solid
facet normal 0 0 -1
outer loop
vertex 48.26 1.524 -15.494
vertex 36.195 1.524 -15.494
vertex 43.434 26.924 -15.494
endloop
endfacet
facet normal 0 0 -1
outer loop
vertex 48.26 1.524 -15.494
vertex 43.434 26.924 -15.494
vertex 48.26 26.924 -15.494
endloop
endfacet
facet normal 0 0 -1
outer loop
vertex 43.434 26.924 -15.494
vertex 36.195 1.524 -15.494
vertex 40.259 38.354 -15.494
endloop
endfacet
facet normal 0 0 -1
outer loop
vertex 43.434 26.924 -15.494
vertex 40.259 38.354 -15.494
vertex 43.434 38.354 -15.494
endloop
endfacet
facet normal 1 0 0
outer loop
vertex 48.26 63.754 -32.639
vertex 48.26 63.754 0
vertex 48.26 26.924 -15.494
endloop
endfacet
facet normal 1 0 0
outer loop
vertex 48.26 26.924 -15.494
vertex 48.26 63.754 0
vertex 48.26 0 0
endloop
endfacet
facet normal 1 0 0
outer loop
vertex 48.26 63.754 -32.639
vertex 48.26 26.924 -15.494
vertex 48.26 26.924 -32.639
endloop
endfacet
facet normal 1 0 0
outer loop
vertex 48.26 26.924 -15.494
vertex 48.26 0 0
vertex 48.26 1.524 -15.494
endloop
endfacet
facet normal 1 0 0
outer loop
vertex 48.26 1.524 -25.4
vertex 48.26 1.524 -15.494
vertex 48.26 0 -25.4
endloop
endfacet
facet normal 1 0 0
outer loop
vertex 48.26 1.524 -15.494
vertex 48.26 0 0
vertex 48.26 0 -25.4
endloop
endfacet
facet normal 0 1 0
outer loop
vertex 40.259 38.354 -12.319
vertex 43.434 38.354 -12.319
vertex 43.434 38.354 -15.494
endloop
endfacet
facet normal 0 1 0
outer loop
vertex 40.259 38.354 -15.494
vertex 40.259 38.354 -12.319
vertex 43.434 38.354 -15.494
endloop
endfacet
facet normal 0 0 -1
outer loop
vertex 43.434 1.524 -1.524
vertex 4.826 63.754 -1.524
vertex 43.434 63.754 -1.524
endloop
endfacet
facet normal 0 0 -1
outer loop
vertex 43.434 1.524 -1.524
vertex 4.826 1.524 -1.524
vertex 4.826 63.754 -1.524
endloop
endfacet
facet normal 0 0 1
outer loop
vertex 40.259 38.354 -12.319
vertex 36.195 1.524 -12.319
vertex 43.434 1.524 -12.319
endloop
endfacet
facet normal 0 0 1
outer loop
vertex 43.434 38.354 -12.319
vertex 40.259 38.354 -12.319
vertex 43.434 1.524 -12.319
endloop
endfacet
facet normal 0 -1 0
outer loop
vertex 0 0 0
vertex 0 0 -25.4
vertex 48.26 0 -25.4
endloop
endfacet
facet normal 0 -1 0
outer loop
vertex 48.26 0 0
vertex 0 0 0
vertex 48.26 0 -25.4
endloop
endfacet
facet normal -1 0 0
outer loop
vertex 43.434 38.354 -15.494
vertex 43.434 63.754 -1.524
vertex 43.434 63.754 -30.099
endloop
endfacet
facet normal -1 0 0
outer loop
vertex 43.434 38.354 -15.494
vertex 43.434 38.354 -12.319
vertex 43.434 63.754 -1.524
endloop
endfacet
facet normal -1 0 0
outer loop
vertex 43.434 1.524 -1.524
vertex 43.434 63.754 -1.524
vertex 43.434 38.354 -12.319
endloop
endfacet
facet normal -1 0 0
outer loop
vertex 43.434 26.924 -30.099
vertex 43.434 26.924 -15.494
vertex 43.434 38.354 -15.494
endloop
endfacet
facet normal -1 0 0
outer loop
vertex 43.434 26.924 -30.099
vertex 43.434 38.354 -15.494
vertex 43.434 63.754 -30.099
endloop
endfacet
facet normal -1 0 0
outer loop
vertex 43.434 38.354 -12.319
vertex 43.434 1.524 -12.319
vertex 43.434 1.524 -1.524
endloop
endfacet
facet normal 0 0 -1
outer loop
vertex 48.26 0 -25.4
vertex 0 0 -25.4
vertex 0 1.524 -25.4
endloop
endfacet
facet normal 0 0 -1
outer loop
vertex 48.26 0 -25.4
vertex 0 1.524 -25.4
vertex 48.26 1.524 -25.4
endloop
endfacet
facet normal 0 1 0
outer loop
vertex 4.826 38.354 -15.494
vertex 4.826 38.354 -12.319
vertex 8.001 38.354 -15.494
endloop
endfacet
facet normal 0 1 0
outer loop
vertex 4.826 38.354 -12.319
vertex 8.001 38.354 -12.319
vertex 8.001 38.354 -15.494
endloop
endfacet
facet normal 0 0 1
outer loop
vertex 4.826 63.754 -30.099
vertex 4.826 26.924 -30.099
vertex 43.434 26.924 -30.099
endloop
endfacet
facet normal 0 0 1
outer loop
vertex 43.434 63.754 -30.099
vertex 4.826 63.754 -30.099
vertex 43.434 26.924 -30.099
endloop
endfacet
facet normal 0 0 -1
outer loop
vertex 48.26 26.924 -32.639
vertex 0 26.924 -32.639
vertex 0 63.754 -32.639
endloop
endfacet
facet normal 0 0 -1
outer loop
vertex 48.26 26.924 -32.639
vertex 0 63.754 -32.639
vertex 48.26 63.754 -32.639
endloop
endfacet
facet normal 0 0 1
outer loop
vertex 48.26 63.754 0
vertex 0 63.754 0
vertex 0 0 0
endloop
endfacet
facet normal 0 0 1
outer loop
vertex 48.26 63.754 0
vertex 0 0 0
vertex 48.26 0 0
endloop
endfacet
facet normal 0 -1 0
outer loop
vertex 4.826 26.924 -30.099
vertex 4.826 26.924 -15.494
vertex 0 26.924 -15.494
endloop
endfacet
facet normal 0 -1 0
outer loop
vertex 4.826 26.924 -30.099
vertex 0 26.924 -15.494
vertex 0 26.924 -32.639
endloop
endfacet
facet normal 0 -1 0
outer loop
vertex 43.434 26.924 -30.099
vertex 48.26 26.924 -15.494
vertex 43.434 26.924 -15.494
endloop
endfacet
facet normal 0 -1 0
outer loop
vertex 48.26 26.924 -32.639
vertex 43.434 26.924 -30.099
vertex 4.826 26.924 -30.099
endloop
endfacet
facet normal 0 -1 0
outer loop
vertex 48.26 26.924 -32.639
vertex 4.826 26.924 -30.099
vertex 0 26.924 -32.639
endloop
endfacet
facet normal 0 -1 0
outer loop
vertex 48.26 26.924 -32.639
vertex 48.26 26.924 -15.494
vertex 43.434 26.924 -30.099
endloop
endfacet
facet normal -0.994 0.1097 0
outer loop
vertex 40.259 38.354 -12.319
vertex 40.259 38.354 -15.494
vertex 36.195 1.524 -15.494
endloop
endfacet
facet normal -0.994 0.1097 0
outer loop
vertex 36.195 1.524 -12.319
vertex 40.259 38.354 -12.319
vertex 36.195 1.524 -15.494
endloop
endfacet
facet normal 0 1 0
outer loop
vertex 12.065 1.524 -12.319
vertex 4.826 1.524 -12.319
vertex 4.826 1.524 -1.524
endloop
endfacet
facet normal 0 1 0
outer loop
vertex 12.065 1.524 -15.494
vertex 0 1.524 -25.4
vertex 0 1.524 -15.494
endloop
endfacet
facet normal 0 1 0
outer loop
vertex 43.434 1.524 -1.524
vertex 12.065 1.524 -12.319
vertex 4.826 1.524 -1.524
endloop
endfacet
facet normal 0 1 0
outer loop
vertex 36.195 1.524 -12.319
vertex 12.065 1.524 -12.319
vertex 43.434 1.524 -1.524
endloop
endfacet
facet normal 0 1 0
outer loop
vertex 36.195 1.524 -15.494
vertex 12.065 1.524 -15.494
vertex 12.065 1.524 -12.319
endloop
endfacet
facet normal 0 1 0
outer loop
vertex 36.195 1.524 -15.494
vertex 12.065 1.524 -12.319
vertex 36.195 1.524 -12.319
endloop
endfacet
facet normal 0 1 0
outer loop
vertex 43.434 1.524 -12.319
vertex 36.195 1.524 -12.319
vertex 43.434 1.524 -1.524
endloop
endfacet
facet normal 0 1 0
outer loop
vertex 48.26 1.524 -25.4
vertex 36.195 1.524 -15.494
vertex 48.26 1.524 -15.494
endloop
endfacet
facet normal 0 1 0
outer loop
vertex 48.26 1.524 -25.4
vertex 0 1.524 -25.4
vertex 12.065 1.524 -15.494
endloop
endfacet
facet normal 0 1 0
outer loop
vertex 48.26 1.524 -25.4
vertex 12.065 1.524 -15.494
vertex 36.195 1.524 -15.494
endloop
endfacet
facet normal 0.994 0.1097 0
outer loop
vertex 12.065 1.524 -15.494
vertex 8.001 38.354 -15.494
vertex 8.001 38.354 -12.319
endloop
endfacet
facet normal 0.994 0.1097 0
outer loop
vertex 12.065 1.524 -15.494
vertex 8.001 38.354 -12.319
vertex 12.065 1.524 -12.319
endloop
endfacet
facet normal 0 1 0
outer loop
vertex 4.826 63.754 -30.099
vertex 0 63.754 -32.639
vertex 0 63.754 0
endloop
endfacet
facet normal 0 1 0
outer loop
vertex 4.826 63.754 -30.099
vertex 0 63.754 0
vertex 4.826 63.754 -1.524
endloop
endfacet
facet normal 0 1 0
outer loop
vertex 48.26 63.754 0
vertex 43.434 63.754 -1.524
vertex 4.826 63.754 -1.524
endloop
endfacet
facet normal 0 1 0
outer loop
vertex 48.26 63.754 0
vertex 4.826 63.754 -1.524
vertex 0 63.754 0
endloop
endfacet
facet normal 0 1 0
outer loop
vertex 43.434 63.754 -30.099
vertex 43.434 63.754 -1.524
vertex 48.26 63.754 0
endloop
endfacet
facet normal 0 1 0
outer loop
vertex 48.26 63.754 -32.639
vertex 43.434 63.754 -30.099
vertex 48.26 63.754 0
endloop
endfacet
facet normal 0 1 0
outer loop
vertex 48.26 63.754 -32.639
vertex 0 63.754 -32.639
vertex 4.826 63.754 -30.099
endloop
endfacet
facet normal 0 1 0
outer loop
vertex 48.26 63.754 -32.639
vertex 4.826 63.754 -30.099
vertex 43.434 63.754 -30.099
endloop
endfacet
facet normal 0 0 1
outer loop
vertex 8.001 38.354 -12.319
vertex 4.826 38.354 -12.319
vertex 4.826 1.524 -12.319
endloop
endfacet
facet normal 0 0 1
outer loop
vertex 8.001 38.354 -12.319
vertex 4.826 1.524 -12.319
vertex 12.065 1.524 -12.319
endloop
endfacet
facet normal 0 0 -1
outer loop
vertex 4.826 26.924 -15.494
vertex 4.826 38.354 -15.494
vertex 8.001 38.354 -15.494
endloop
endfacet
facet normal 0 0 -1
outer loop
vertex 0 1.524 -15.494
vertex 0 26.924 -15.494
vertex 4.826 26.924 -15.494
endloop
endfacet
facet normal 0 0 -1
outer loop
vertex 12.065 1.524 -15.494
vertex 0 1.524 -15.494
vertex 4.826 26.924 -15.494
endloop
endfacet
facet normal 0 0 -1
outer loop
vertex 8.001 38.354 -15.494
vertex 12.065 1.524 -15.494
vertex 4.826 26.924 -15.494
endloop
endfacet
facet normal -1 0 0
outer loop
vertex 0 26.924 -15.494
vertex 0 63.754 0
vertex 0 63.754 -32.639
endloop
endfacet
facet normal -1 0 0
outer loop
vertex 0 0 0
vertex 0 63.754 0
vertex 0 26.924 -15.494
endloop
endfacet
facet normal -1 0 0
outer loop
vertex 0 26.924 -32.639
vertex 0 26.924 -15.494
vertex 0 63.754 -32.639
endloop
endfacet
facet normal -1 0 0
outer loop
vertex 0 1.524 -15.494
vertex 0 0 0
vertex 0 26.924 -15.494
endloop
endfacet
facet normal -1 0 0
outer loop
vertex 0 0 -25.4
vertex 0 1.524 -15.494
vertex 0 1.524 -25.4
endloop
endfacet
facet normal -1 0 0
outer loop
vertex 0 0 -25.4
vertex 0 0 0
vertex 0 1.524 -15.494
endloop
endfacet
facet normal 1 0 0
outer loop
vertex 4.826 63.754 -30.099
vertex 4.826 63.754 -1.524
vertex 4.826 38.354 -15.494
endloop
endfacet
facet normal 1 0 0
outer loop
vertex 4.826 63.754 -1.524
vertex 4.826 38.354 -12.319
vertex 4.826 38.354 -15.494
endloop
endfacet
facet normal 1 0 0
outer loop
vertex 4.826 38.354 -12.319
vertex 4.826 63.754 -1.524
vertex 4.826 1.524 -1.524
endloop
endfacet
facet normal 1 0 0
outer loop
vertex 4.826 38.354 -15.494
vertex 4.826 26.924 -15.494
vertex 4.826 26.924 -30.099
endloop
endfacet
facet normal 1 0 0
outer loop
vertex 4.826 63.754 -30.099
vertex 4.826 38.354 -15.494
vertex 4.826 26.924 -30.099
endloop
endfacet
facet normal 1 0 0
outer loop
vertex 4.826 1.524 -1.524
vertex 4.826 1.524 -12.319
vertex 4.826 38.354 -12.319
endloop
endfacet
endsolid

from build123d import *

# Parameters (mm, degrees)
SKETCH1_W           = 48.26
SKETCH1_H           = 25.4
BOSS_EXTRUDE1_DEPTH = 1.524
BOSS_EXTRUDE2_DEPTH = 36.83
SKETCH3_W           = 3.175
SKETCH3_H           = 3.175
BOSS_EXTRUDE3_DEPTH = 36.83
BOSS_EXTRUDE4_DEPTH = 3.175
SKETCH5_W           = 4.826
SKETCH5_H           = 11.43
BOSS_EXTRUDE5_DEPTH = 14.605
SKETCH7_W           = 2.54
SKETCH7_H           = 11.43
BOSS_EXTRUDE6_DEPTH = 48.26
SKETCH8_W           = 48.26
SKETCH8_H           = 32.639
SKETCH8_W_2         = 38.608
SKETCH8_H_2         = 28.575
BOSS_EXTRUDE7_DEPTH = 25.4


with BuildPart() as part:
    # Sketch1 → Boss-Extrude1 (new body)
    with BuildSketch(Plane(origin=(0, 0, 0), x_dir=(1, 0, 0), z_dir=(0, 1, 0))):
        with Locations((24.13, 12.7)):
            Rectangle(SKETCH1_W, SKETCH1_H)
    extrude(amount=BOSS_EXTRUDE1_DEPTH)

    # Sketch2 → Boss-Extrude2 (add)
    with BuildSketch(Plane(origin=(0, 1.524, 0), x_dir=(1, 0, 0), z_dir=(0, 1, 0))):
        Polygon((0, 15.494), (4.826, 15.494), (4.826, 1.524), (43.434, 1.524), (43.434, 15.494), (48.26, 15.494), (48.26, 0), (0, 0), align=None)
    extrude(amount=BOSS_EXTRUDE2_DEPTH)

    # Sketch3 → Boss-Extrude3 (add)
    with BuildSketch(Plane(origin=(0, 1.524, 0), x_dir=(1, 0, 0), z_dir=(0, 1, 0))):
        with Locations((6.4135, 13.9065)):
            Rectangle(SKETCH3_W, SKETCH3_H)
        with Locations((41.8465, 13.9065)):
            Rectangle(SKETCH3_W, SKETCH3_H)
    extrude(amount=BOSS_EXTRUDE3_DEPTH)

    # Sketch4 → Boss-Extrude4 (add)
    with BuildSketch(Plane(origin=(0, 0, -15.494), x_dir=(-1, 0, 0), z_dir=(0, 0, -1))):
        Polygon((-40.259, 38.354), (-36.195, 1.524), (-40.259, 1.524), align=None)
        Polygon((-8.001, 38.354), (-12.065, 1.524), (-8.001, 1.524), align=None)
    extrude(amount=-BOSS_EXTRUDE4_DEPTH)

    # Sketch5 → Boss-Extrude5 (add)
    with BuildSketch(Plane(origin=(0, 0, -15.494), x_dir=(-1, 0, 0), z_dir=(0, 0, -1))):
        with Locations((-45.847, 32.639)):
            Rectangle(SKETCH5_W, SKETCH5_H)
        with Locations((-2.413, 32.639)):
            Rectangle(SKETCH5_W, SKETCH5_H)
    extrude(amount=BOSS_EXTRUDE5_DEPTH)

    # Sketch7 → Boss-Extrude6 (add)
    with BuildSketch(Plane(origin=(48.26, 0, 0), x_dir=(0, 0, -1), z_dir=(1, 0, 0))):
        with Locations((31.369, 32.639)):
            Rectangle(SKETCH7_W, SKETCH7_H)
    extrude(amount=-BOSS_EXTRUDE6_DEPTH)

    # Sketch8 → Boss-Extrude7 (add)
    with BuildSketch(Plane(origin=(0, 38.354, 0), x_dir=(1, 0, 0), z_dir=(0, 1, 0))):
        with Locations((24.13, 16.3195)):
            Rectangle(SKETCH8_W, SKETCH8_H)
        with Locations((24.13, 15.8115)):
            Rectangle(SKETCH8_W_2, SKETCH8_H_2, mode=Mode.SUBTRACT)
    extrude(amount=BOSS_EXTRUDE7_DEPTH)


solid = part.part
